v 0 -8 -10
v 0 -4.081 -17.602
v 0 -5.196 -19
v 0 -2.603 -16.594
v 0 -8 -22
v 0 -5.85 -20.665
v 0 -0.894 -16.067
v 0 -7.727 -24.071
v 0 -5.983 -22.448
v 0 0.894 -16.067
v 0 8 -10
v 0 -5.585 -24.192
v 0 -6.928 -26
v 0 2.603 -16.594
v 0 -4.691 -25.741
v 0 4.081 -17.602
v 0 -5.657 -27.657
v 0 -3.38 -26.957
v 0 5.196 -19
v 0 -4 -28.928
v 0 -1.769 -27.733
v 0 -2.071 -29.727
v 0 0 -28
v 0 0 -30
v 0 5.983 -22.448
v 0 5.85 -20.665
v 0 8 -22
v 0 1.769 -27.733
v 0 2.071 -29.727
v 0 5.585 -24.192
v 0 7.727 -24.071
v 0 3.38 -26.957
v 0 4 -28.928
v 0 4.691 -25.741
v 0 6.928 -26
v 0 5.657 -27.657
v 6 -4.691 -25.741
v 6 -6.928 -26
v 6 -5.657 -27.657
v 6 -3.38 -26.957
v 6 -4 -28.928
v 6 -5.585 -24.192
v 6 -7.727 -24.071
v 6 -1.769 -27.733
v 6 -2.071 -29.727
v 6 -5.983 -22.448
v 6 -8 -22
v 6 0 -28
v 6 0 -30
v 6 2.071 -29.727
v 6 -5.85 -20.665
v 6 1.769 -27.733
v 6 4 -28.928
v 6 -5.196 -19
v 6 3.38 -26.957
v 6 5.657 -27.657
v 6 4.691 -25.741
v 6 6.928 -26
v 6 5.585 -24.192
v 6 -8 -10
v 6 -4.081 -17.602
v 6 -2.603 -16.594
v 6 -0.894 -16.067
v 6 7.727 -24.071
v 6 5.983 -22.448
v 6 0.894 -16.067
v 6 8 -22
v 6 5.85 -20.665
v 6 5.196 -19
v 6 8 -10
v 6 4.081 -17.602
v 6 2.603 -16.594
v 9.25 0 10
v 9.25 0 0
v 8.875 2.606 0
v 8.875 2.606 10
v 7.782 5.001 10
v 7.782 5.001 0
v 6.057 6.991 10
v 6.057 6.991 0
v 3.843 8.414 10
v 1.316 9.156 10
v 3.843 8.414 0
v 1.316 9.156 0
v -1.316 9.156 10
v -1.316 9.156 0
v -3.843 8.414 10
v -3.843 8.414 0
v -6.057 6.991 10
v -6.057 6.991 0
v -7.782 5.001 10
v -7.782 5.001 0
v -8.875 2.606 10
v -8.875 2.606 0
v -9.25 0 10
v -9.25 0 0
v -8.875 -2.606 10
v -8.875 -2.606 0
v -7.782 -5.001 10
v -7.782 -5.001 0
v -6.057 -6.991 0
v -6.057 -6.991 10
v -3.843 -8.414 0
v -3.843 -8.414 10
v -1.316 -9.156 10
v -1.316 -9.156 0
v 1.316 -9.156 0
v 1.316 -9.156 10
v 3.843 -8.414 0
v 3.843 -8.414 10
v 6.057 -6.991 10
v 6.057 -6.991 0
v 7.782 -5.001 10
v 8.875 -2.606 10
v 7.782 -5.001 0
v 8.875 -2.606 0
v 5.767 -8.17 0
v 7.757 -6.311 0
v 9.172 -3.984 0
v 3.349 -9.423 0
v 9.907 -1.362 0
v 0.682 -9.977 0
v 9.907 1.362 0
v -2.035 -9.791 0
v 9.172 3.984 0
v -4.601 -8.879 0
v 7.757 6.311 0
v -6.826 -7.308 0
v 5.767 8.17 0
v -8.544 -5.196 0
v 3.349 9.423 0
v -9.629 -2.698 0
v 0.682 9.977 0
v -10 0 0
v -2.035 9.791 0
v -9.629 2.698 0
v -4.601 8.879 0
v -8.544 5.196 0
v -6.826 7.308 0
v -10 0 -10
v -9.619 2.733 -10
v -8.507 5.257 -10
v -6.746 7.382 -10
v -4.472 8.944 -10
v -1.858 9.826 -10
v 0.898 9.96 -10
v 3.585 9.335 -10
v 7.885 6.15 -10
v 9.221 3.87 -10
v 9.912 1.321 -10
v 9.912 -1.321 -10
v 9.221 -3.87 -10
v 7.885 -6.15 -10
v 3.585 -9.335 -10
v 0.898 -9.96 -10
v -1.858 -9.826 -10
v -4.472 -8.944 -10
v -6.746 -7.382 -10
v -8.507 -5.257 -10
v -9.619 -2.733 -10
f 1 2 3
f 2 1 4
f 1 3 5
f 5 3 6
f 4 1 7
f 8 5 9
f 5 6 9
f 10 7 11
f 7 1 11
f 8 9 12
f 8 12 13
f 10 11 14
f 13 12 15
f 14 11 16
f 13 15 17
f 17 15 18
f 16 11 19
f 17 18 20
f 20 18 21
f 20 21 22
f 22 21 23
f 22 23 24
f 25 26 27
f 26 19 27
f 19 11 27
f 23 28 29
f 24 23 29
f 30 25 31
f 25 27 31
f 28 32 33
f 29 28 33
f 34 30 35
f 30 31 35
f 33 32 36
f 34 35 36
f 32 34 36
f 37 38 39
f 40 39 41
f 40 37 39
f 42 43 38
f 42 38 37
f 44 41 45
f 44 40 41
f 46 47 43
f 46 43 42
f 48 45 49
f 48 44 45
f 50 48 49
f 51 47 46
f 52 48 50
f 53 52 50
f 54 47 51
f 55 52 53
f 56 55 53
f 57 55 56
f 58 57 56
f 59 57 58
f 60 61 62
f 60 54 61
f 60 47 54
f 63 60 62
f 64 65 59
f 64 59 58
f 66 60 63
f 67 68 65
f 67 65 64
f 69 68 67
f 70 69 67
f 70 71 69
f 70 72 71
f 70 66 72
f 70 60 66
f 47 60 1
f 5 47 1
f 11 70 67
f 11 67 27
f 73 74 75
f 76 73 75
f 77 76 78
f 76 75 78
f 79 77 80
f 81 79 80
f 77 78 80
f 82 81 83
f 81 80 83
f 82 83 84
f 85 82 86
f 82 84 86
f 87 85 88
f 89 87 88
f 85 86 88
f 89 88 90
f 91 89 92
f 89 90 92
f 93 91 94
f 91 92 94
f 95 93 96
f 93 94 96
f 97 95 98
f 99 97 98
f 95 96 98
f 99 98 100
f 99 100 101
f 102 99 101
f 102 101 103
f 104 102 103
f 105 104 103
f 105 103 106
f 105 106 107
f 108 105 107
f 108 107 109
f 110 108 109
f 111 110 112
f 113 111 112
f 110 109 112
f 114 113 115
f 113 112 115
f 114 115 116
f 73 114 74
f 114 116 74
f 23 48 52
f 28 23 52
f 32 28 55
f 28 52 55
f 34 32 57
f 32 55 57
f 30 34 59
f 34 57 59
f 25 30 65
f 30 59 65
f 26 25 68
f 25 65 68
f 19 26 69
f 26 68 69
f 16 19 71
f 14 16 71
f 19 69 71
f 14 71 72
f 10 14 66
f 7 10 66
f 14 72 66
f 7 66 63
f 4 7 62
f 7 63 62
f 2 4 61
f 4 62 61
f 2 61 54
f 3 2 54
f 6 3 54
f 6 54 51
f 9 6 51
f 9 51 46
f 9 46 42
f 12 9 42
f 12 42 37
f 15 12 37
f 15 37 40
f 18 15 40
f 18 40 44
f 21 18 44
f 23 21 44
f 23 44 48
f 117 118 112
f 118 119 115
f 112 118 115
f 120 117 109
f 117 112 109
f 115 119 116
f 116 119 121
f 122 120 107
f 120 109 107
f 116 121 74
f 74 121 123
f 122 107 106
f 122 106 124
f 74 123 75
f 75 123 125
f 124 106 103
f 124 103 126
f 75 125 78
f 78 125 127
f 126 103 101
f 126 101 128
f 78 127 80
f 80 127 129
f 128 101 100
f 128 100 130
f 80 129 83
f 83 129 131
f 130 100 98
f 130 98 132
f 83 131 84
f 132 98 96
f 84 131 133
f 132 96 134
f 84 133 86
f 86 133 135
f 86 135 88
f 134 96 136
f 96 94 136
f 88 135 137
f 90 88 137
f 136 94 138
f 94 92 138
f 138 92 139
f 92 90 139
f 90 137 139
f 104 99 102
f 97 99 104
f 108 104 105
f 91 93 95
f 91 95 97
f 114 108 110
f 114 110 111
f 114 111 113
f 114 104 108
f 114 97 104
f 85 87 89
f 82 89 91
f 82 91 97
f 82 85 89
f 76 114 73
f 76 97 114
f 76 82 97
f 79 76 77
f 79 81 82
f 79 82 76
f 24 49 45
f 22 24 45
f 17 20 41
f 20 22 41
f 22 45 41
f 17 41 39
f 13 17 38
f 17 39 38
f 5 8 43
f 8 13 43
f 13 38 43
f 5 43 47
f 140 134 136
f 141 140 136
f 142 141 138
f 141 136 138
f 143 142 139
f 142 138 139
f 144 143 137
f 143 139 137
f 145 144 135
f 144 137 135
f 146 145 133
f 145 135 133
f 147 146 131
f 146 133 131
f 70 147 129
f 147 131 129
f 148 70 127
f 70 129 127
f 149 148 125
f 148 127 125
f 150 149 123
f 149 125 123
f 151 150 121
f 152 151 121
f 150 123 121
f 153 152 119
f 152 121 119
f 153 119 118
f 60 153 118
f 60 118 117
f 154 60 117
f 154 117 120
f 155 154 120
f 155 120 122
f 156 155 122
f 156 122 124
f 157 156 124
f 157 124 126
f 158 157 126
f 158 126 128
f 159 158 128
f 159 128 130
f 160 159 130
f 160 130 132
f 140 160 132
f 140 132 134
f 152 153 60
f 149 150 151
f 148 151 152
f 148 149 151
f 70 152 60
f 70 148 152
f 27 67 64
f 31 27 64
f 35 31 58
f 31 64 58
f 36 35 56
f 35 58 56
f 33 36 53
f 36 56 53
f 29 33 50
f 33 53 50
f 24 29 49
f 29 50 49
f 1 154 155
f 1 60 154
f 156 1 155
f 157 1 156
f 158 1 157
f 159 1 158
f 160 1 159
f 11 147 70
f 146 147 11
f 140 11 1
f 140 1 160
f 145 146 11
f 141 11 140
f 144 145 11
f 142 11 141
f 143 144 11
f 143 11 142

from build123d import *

# Parameters (mm, degrees)
SKETCH1_R               = 9.25
BOSS_EXTRUDE1_DEPTH     = 10
SKETCH2_R               = 10
BOSS_EXTRUDE2_DEPTH     = 10
SKETCH3_W               = 12
SKETCH3_H               = 16
BOSS_EXTRUDE3_DEPTH     = 20
CUT_EXTRUDE1_DEPTH      = 5
CUT_EXTRUDE1_DEPTH_BACK = 30
SKETCH4_3_R             = 6
CUT_EXTRUDE2_DEPTH      = 17
SKETCH5_W               = 6
SKETCH5_H               = 20
CUT_EXTRUDE3_DEPTH      = 19


with BuildPart() as part:
    # Sketch1 → Boss-Extrude1 (new body)
    with BuildSketch(Plane.XY):
        Circle(SKETCH1_R)
    extrude(amount=BOSS_EXTRUDE1_DEPTH)

    # Sketch2 → Boss-Extrude2 (add)
    with BuildSketch(Plane(origin=(0, 0, 0), x_dir=(-1, 0, 0), z_dir=(0, 0, -1))):
        Circle(SKETCH2_R)
    extrude(amount=BOSS_EXTRUDE2_DEPTH)

    # Sketch3 → Boss-Extrude3 (add)
    with BuildSketch(Plane(origin=(0, 0, -10), x_dir=(-1, 0, 0), z_dir=(0, 0, -1))):
        Rectangle(SKETCH3_W, SKETCH3_H)
    extrude(amount=BOSS_EXTRUDE3_DEPTH)

    # Sketch4 → Cut-Extrude1 (cut, two sides)
    with BuildSketch(Plane(origin=(6, 0, 0), x_dir=(0, 0, -1), z_dir=(1, 0, 0))) as cut_extrude1_sk:
        with BuildLine():
            Line((30, 8), (22, 8))
            ThreePointArc((22, 8), (27.656854249, 5.656854249), (30, 0))
            Line((30, 0), (30, 8))
        make_face()
        with BuildLine():
            Line((30, -8), (30, 0))
            ThreePointArc((30, 0), (27.656854249, -5.656854249), (22, -8))
            Line((22, -8), (30, -8))
        make_face()
    extrude(amount=CUT_EXTRUDE1_DEPTH, mode=Mode.SUBTRACT)
    extrude(cut_extrude1_sk.sketch, amount=-CUT_EXTRUDE1_DEPTH_BACK, mode=Mode.SUBTRACT)

    # Sketch4<3> → Cut-Extrude2 (cut, through all)
    with BuildSketch(Plane(origin=(6, 0, 0), x_dir=(0, 0, -1), z_dir=(1, 0, 0))):
        with Locations((22, 0)):
            Circle(SKETCH4_3_R)
    extrude(amount=-CUT_EXTRUDE2_DEPTH, mode=Mode.SUBTRACT)

    # Sketch5 → Cut-Extrude3 (cut, through all)
    with BuildSketch(Plane(origin=(0, 8, 0), x_dir=(1, 0, 0), z_dir=(0, 1, 0))):
        with Locations((-3, 20)):
            Rectangle(SKETCH5_W, SKETCH5_H)
    extrude(amount=-CUT_EXTRUDE3_DEPTH, mode=Mode.SUBTRACT)


solid = part.part
